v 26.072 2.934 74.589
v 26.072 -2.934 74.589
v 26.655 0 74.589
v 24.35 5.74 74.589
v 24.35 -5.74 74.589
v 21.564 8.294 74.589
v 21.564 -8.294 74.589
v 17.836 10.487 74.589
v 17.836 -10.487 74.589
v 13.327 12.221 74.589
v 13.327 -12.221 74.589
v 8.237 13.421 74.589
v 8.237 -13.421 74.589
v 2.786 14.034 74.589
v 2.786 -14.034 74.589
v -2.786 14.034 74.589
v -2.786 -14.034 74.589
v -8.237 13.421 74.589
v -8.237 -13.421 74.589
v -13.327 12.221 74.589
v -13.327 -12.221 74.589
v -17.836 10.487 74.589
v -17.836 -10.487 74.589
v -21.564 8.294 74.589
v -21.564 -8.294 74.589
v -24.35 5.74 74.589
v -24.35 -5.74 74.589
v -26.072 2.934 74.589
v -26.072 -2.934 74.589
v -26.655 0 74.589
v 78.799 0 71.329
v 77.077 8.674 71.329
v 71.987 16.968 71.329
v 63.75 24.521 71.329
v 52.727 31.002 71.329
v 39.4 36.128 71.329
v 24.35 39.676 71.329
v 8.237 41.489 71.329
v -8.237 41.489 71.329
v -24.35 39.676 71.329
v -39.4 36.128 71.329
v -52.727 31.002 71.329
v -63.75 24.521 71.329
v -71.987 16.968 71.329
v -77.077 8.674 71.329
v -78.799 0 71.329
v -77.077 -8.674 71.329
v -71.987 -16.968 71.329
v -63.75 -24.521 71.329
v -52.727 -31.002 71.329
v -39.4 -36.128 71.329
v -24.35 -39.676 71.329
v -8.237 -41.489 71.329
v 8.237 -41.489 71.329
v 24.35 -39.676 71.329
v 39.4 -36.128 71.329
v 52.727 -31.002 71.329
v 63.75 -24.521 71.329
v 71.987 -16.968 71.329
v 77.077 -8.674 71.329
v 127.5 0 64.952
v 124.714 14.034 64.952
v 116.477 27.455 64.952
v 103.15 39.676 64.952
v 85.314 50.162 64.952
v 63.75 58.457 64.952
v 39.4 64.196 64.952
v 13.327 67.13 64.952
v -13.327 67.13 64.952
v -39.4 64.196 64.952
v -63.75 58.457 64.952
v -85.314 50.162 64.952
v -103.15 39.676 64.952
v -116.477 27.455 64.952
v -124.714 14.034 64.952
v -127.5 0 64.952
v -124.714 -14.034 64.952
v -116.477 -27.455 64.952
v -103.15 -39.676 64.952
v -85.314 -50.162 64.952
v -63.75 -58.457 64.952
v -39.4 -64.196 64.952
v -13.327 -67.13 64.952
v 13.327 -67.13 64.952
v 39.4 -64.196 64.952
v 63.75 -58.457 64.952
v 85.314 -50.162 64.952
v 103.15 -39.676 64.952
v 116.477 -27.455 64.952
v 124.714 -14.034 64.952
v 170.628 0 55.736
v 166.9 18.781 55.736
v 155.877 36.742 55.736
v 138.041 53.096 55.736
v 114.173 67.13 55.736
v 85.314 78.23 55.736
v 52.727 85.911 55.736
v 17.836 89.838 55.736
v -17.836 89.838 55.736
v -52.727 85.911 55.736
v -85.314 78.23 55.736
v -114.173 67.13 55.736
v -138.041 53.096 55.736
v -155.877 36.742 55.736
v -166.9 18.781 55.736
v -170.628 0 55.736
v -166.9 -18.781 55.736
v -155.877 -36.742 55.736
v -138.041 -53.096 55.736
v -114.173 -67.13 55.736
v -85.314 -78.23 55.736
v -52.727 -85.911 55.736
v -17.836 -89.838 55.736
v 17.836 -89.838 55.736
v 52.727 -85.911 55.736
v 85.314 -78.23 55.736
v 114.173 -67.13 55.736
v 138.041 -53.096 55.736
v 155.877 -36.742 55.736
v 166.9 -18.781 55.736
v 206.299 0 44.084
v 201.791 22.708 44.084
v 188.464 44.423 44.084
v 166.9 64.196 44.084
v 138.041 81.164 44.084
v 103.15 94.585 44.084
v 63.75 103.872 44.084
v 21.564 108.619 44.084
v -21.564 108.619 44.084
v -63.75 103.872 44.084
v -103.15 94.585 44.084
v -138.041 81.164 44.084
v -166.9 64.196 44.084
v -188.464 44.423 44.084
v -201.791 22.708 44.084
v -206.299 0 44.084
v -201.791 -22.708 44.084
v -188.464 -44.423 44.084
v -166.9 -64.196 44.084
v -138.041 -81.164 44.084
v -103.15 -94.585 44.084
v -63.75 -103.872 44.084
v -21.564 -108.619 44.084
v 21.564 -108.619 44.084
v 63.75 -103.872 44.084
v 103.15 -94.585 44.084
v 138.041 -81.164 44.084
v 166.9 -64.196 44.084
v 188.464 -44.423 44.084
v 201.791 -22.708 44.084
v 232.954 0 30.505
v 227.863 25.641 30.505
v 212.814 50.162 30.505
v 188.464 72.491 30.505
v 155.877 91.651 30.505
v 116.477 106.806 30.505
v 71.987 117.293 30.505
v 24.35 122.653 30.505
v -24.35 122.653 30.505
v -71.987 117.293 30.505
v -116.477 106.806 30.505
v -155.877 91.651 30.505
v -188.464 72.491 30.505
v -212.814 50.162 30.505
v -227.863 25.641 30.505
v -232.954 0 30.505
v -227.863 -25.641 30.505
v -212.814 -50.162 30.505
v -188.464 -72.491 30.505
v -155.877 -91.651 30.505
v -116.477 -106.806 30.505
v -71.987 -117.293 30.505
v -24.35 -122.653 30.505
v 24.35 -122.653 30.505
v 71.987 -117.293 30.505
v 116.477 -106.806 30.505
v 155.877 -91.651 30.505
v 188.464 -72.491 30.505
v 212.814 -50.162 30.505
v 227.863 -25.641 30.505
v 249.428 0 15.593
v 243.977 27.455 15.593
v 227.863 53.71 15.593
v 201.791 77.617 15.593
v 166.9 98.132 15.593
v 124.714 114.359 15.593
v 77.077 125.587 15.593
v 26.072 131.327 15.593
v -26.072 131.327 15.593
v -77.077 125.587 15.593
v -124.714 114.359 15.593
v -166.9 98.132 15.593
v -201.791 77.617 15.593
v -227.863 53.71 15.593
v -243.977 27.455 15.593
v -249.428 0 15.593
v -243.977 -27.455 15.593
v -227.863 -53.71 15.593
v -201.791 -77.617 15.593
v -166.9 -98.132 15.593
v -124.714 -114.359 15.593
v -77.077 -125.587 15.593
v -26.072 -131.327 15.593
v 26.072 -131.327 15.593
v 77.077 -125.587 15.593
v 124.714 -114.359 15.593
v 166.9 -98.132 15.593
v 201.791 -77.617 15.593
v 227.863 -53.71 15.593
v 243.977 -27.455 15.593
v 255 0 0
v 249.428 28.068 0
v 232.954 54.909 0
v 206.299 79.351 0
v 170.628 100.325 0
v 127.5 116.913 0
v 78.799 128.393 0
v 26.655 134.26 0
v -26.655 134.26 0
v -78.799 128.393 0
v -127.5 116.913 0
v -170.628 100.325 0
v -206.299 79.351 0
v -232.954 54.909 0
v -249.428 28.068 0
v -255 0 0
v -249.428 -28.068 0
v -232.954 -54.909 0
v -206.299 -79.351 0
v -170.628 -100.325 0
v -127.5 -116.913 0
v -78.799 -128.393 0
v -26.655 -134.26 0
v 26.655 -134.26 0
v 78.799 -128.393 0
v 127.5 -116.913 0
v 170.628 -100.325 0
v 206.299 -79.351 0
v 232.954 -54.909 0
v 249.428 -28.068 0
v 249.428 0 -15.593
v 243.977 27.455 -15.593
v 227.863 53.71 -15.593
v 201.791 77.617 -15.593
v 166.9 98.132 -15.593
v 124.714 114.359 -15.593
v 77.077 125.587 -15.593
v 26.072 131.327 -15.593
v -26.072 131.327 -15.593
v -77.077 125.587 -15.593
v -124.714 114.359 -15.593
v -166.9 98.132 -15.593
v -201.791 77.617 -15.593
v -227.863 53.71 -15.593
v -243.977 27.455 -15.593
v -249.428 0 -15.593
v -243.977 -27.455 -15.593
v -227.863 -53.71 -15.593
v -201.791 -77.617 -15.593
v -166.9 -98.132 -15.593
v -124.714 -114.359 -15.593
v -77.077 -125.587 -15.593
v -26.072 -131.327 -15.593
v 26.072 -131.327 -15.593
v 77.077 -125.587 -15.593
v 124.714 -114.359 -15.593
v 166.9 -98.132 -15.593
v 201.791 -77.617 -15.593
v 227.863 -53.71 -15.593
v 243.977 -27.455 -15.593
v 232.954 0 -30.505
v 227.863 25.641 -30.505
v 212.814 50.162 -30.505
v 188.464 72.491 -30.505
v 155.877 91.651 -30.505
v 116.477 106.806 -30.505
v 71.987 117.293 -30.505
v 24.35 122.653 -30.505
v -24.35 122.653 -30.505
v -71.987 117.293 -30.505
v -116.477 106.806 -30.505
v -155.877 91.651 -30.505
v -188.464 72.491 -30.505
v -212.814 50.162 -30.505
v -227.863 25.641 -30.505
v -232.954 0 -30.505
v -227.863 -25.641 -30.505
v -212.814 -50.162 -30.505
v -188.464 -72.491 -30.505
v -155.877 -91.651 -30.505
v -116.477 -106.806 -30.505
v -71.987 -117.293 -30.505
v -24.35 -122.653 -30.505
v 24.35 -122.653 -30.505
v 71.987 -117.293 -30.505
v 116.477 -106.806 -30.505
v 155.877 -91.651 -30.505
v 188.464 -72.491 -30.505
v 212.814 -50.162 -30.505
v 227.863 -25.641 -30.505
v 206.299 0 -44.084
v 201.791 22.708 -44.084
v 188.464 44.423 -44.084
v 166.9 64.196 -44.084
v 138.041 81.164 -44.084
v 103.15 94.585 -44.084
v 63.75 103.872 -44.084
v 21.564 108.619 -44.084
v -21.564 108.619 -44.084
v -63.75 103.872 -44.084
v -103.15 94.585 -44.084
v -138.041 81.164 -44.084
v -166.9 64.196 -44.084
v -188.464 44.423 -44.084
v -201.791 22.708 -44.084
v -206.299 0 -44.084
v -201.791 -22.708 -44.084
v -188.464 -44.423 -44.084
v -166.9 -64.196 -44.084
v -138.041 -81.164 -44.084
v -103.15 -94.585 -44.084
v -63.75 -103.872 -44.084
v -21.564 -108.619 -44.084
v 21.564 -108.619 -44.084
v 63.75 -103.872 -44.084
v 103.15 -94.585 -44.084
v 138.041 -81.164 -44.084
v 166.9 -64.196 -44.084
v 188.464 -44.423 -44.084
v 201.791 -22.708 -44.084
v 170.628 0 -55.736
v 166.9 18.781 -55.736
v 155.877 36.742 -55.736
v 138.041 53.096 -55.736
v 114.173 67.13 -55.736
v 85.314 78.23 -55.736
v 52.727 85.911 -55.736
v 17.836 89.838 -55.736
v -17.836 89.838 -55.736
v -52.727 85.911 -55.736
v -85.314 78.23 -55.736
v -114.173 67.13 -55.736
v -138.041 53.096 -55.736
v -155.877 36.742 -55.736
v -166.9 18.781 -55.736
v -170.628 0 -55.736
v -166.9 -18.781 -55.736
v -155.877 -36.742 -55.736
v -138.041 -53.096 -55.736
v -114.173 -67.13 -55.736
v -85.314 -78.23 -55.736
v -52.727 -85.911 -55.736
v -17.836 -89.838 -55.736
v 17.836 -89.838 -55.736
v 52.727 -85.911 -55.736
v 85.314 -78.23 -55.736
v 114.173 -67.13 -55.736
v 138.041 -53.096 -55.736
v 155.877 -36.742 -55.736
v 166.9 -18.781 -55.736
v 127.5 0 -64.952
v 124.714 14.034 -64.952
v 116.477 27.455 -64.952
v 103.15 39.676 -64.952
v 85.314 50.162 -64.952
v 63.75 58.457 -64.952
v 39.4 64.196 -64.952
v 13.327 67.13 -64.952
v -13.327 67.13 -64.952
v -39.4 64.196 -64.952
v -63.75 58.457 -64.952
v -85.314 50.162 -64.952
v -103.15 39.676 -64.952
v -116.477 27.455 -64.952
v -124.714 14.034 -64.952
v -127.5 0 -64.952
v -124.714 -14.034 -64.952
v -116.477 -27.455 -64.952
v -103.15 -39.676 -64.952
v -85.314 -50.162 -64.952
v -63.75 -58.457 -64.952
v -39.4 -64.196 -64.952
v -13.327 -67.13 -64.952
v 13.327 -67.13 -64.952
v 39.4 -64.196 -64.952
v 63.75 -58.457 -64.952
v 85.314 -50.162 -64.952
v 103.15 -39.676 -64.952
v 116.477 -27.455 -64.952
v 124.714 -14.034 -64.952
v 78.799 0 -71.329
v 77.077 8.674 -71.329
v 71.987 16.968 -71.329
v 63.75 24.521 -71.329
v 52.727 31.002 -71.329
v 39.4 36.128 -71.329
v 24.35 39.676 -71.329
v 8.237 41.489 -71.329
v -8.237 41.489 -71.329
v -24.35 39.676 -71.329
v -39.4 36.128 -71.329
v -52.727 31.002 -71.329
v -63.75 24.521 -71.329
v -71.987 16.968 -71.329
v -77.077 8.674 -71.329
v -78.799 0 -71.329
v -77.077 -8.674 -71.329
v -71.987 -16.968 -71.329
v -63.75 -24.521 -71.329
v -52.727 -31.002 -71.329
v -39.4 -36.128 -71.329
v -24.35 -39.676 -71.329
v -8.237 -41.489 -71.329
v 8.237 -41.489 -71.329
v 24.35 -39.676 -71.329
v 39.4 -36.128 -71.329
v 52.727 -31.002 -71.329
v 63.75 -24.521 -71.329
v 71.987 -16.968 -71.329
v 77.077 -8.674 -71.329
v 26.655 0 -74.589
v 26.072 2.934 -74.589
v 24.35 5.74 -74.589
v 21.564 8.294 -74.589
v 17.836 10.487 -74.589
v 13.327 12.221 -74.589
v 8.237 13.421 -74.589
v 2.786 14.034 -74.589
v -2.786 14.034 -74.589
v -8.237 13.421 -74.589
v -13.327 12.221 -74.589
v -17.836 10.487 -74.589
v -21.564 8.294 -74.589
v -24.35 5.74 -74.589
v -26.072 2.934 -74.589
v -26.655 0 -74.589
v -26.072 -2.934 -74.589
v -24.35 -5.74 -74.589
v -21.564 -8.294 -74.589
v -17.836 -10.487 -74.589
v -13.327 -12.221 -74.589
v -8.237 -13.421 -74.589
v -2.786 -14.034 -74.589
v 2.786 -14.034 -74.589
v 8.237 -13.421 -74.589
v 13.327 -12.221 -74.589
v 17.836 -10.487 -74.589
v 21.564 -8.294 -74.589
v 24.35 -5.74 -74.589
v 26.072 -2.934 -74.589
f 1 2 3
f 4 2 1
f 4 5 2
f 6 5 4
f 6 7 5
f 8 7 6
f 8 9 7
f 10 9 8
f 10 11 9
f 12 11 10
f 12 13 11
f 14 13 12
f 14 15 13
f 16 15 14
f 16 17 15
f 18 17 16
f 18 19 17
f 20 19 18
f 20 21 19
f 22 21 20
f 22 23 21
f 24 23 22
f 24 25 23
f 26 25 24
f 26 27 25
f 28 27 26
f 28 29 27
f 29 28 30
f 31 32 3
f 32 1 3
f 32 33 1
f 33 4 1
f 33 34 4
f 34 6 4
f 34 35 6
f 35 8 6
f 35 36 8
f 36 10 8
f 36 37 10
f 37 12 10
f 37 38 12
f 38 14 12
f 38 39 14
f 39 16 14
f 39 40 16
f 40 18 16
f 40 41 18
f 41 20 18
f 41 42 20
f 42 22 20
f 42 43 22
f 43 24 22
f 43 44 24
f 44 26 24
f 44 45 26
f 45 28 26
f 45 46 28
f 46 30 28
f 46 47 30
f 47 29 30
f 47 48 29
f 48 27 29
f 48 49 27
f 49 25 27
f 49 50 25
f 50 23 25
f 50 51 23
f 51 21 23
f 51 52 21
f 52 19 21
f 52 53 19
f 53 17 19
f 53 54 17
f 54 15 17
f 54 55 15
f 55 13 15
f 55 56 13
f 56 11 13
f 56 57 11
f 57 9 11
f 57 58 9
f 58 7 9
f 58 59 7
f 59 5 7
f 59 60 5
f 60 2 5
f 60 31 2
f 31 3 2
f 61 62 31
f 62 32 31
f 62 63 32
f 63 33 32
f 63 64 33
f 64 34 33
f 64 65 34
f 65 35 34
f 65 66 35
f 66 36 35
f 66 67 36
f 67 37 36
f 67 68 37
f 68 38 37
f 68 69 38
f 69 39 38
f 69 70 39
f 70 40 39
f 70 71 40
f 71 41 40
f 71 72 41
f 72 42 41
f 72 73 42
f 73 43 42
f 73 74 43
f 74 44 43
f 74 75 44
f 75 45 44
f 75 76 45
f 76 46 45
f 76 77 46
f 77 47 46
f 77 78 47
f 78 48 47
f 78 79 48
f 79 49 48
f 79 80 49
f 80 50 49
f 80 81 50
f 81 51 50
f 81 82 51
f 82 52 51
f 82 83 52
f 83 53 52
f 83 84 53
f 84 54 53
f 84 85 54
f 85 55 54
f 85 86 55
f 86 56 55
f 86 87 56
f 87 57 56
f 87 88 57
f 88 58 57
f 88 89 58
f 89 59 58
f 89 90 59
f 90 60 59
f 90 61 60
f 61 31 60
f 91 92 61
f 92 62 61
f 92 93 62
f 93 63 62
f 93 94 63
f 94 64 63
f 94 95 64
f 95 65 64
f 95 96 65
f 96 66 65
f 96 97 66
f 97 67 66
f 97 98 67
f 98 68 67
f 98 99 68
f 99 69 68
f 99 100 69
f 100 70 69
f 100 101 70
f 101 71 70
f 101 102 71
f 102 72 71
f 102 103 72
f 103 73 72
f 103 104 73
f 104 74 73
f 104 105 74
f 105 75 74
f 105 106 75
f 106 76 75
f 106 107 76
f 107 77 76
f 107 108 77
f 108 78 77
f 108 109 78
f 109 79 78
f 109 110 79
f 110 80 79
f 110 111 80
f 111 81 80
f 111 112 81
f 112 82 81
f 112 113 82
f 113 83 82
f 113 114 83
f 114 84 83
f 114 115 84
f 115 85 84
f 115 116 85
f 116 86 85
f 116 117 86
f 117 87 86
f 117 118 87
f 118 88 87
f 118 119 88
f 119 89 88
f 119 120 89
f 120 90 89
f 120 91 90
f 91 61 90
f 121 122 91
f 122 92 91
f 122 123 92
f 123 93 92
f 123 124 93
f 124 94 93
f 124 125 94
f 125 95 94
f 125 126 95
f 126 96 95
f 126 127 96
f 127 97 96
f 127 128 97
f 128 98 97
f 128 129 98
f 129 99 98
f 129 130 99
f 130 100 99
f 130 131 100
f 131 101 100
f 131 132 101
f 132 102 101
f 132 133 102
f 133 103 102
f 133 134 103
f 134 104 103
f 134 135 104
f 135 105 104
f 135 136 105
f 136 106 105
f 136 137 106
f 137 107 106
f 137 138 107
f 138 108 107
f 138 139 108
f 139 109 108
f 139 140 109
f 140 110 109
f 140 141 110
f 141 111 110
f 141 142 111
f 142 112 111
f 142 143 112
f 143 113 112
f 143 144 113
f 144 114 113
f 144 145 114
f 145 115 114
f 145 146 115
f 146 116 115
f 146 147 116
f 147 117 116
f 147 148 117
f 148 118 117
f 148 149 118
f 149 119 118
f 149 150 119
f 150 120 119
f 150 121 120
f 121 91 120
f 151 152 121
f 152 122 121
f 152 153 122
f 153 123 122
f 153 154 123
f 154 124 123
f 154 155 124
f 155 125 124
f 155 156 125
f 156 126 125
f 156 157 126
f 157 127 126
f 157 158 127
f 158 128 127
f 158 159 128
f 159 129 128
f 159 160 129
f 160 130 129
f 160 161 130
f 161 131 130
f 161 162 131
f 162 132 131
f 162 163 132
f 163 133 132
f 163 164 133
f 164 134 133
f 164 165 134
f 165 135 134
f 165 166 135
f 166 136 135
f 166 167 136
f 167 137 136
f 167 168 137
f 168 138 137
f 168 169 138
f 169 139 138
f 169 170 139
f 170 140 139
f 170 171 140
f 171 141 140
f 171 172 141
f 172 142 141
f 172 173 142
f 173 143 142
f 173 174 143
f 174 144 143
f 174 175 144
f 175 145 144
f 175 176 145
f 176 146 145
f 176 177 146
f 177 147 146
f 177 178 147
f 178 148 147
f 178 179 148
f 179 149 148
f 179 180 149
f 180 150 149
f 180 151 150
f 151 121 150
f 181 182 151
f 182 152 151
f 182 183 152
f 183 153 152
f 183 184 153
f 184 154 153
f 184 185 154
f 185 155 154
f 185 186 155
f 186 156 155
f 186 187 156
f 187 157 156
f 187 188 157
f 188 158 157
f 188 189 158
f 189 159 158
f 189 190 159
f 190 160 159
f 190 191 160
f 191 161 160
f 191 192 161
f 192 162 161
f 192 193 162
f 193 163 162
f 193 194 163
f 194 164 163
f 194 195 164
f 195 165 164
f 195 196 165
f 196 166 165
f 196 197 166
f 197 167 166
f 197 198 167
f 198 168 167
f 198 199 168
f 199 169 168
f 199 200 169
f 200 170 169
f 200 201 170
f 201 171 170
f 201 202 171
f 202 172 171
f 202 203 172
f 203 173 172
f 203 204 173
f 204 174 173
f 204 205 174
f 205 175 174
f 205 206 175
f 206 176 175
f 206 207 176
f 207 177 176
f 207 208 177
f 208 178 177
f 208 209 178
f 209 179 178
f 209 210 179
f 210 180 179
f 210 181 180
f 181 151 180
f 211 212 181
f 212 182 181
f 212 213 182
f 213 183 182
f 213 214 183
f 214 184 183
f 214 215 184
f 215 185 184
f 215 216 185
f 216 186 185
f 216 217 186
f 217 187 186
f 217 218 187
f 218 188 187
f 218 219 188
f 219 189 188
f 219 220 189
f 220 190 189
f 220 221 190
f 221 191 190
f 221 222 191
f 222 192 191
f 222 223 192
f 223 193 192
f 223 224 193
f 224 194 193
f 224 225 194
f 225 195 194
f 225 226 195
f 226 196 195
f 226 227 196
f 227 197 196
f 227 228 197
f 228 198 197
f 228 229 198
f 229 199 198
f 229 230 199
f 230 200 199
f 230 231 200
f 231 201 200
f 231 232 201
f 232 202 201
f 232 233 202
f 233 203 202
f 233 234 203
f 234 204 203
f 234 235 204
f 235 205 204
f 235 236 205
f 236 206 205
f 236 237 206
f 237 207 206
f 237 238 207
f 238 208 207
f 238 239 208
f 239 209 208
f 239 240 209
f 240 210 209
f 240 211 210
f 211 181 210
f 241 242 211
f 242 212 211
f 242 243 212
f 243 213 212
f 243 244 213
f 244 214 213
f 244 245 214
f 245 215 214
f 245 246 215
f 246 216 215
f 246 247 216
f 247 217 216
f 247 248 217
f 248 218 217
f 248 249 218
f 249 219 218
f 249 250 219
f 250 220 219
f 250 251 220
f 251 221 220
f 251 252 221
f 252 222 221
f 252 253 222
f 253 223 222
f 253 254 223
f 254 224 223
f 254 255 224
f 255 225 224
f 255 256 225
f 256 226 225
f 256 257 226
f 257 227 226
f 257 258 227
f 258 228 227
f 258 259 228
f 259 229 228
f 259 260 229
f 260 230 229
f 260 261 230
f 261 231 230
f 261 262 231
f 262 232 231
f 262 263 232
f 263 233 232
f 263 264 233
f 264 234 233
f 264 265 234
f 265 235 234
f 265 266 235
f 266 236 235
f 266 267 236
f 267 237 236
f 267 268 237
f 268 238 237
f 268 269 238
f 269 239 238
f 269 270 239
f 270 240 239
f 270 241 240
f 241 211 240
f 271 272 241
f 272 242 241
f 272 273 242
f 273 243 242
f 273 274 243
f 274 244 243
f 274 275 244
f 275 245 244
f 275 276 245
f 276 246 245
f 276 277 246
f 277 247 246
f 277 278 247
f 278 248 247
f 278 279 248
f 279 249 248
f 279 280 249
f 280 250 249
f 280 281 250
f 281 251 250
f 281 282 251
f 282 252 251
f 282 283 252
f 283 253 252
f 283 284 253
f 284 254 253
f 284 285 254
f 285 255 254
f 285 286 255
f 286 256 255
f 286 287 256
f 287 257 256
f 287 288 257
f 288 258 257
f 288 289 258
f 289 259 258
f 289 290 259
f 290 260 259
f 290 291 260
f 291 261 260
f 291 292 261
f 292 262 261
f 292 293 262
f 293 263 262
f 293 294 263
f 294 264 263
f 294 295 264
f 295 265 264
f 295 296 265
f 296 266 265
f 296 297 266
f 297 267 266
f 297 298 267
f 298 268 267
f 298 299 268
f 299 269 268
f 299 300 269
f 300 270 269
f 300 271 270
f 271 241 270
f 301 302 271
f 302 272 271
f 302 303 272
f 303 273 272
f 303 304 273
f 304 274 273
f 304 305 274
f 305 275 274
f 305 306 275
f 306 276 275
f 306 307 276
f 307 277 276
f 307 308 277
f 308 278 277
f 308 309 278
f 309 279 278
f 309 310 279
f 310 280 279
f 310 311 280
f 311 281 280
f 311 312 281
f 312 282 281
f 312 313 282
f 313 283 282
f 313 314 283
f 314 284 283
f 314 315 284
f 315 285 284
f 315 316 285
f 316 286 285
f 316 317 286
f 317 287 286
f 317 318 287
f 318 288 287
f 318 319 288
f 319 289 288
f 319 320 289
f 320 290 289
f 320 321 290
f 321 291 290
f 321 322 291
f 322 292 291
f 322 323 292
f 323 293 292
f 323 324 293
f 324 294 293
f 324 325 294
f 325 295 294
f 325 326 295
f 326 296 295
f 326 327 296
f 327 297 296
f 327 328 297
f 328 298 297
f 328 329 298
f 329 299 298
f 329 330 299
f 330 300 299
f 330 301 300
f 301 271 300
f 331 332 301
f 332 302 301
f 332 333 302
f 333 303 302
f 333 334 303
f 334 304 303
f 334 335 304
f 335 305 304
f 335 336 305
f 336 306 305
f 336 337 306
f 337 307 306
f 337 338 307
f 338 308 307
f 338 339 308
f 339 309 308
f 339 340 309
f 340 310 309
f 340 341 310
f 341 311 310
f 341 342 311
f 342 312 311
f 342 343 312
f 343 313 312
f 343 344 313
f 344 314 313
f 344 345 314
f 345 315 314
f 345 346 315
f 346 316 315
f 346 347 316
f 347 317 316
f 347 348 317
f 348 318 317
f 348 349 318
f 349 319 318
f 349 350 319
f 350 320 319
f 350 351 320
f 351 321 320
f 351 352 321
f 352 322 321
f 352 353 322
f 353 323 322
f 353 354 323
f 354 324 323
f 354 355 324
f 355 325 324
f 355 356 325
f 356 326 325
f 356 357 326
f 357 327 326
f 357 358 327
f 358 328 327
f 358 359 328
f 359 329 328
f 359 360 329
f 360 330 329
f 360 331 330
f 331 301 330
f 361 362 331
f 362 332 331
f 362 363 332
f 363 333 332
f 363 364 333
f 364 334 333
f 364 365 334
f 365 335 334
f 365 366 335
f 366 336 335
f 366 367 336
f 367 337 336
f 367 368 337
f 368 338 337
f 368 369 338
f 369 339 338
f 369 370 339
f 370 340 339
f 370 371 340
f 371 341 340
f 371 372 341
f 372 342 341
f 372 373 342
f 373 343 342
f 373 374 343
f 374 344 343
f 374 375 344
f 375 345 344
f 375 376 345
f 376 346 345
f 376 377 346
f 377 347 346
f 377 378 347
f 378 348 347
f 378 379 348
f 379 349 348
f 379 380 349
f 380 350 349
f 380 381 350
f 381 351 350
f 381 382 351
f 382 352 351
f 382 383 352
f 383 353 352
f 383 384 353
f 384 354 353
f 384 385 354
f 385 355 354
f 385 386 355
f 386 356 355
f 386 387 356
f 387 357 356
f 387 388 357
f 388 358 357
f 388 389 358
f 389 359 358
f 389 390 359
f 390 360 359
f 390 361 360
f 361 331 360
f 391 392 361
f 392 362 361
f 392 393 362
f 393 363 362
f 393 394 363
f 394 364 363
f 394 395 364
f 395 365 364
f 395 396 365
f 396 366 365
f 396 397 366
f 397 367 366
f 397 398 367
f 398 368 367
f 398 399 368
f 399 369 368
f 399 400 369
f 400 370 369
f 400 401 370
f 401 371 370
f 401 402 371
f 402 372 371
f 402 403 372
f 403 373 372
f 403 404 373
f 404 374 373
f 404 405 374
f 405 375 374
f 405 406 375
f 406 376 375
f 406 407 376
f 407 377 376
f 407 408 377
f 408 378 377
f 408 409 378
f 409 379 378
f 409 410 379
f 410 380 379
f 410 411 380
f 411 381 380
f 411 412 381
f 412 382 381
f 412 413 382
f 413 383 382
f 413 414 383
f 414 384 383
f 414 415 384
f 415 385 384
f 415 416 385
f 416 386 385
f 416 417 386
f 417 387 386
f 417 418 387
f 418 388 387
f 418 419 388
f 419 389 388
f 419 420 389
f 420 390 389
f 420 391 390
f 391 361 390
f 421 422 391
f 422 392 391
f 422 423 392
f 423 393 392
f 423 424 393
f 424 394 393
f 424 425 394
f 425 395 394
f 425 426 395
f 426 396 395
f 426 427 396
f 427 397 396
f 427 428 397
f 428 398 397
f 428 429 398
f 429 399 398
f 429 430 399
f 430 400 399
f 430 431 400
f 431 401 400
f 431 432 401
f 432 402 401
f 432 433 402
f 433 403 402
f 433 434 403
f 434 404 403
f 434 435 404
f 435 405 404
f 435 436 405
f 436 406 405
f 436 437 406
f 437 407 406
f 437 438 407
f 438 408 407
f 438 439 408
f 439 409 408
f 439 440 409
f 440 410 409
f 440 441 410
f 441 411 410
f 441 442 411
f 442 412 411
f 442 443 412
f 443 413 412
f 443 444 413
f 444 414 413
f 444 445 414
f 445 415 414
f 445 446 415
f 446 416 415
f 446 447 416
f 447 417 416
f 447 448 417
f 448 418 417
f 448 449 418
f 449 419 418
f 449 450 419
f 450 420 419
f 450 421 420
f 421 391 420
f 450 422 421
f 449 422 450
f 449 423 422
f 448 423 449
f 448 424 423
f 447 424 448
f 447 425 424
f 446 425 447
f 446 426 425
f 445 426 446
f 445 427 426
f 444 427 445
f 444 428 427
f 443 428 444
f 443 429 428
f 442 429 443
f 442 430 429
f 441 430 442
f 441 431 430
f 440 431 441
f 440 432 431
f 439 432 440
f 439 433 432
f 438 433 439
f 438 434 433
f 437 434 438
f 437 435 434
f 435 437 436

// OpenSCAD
// Generated by SolidPython 1.0.1 on 2020-07-29 00:46:53


scale(v = [17, 9, 5]) {
	sphere(r = 15);
}
/***********************************************
*********      SolidPython code:      **********
************************************************
 
# import packages: SolidPython
from solid import *
from solid.utils import *
from itertools import chain, combinations, permutations


class Resize:

    def __init__(self, scad_file):
        self.scad_file = scad_file
        #self.scad_file = import_scad(scad_file)
        # cone/cylinder param:
        self.r1 = 0
        self.r2 = 0
        self.h = 0
        # rectangular prism param:
        self.w = 0
        self.l = 0
        # ellipse param:
        self.r = 0

    # import OpenScad code (file name corresponds to shape)


    # classify shape + parameters
    def assign(self, param1, param2, param3):
        if self.scad_file == 'cone.scad':
            self.r1 = param1
            self.r2 = param2
            self.h = param3
        elif self.scad_file == 'cylinder.scad':
            self.r1 = param1
            self.r2 = param2
            self.h = param3
        elif self.scad_file == 'rectangularPrism.scad':
            self.h = param1
            self.l = param2
            self.w = param3
        else:
            self.r = param1
            self.h = param2

    # resize parameters
    def iterate(self):
        x = range(3, 20, 2)
        i = 1
        if self.scad_file == 'cone.scad':
            tempList = list(permutations(x, 2))
            for temp in tempList:
                param1 = temp[0]
                param2 = temp[1]
                filepath = 'produced_scad_files/' + 'cone' + str(param1) + '_' + str(param2) + '_' + '.scad'
                scad_render_to_file(cylinder(h=param1, r1=param2, r2=0), filepath)

        elif self.scad_file == 'cylinder.scad':
            tempList = list(permutations(x, 3))
            for temp in tempList:
                param1 = temp[0]
                param2 = temp[1]
                filepath = 'produced_scad_files/' + 'cylinder' + str(param1) + '_' + str(param2) + '_' + '.scad'
                scad_render_to_file(cylinder(h=param1, r1=param2, r2=param2), filepath)

        elif self.scad_file == 'rectangularPrism.scad':
            tempList = list(permutations(x, 3))
            for temp in tempList:
                param1 = temp[0]
                param2 = temp[1]
                param3 = temp[2]
                filepath = 'produced_scad_files/' + 'rectangularPrism' + str(param1) + '_' + str(param2) + '_' + str(
                    param3) + '.scad'
                scad_render_to_file(cube(size=(param1, param2, param3)), filepath)

        elif self.scad_file == 'ellipse.scad':
            tempList = list(permutations(x, 4))
            for temp in tempList:
                param1 = temp[0]
                param2 = temp[1]
                param3 = temp[2]
                param4 = temp[3]
                filepath = 'produced_scad_files/' + 'ellipse' + str(param1) + '_' + str(param2) + '_' + str(param3) + '_' + str(param4) + '.scad'
                scad_render_to_file(scale([param1, param2, param3])(sphere(r=param4)), filepath)

    def render_to_scadfile(self):
        scad_render_to_file(scad, 'example.scad') 
 
************************************************/
